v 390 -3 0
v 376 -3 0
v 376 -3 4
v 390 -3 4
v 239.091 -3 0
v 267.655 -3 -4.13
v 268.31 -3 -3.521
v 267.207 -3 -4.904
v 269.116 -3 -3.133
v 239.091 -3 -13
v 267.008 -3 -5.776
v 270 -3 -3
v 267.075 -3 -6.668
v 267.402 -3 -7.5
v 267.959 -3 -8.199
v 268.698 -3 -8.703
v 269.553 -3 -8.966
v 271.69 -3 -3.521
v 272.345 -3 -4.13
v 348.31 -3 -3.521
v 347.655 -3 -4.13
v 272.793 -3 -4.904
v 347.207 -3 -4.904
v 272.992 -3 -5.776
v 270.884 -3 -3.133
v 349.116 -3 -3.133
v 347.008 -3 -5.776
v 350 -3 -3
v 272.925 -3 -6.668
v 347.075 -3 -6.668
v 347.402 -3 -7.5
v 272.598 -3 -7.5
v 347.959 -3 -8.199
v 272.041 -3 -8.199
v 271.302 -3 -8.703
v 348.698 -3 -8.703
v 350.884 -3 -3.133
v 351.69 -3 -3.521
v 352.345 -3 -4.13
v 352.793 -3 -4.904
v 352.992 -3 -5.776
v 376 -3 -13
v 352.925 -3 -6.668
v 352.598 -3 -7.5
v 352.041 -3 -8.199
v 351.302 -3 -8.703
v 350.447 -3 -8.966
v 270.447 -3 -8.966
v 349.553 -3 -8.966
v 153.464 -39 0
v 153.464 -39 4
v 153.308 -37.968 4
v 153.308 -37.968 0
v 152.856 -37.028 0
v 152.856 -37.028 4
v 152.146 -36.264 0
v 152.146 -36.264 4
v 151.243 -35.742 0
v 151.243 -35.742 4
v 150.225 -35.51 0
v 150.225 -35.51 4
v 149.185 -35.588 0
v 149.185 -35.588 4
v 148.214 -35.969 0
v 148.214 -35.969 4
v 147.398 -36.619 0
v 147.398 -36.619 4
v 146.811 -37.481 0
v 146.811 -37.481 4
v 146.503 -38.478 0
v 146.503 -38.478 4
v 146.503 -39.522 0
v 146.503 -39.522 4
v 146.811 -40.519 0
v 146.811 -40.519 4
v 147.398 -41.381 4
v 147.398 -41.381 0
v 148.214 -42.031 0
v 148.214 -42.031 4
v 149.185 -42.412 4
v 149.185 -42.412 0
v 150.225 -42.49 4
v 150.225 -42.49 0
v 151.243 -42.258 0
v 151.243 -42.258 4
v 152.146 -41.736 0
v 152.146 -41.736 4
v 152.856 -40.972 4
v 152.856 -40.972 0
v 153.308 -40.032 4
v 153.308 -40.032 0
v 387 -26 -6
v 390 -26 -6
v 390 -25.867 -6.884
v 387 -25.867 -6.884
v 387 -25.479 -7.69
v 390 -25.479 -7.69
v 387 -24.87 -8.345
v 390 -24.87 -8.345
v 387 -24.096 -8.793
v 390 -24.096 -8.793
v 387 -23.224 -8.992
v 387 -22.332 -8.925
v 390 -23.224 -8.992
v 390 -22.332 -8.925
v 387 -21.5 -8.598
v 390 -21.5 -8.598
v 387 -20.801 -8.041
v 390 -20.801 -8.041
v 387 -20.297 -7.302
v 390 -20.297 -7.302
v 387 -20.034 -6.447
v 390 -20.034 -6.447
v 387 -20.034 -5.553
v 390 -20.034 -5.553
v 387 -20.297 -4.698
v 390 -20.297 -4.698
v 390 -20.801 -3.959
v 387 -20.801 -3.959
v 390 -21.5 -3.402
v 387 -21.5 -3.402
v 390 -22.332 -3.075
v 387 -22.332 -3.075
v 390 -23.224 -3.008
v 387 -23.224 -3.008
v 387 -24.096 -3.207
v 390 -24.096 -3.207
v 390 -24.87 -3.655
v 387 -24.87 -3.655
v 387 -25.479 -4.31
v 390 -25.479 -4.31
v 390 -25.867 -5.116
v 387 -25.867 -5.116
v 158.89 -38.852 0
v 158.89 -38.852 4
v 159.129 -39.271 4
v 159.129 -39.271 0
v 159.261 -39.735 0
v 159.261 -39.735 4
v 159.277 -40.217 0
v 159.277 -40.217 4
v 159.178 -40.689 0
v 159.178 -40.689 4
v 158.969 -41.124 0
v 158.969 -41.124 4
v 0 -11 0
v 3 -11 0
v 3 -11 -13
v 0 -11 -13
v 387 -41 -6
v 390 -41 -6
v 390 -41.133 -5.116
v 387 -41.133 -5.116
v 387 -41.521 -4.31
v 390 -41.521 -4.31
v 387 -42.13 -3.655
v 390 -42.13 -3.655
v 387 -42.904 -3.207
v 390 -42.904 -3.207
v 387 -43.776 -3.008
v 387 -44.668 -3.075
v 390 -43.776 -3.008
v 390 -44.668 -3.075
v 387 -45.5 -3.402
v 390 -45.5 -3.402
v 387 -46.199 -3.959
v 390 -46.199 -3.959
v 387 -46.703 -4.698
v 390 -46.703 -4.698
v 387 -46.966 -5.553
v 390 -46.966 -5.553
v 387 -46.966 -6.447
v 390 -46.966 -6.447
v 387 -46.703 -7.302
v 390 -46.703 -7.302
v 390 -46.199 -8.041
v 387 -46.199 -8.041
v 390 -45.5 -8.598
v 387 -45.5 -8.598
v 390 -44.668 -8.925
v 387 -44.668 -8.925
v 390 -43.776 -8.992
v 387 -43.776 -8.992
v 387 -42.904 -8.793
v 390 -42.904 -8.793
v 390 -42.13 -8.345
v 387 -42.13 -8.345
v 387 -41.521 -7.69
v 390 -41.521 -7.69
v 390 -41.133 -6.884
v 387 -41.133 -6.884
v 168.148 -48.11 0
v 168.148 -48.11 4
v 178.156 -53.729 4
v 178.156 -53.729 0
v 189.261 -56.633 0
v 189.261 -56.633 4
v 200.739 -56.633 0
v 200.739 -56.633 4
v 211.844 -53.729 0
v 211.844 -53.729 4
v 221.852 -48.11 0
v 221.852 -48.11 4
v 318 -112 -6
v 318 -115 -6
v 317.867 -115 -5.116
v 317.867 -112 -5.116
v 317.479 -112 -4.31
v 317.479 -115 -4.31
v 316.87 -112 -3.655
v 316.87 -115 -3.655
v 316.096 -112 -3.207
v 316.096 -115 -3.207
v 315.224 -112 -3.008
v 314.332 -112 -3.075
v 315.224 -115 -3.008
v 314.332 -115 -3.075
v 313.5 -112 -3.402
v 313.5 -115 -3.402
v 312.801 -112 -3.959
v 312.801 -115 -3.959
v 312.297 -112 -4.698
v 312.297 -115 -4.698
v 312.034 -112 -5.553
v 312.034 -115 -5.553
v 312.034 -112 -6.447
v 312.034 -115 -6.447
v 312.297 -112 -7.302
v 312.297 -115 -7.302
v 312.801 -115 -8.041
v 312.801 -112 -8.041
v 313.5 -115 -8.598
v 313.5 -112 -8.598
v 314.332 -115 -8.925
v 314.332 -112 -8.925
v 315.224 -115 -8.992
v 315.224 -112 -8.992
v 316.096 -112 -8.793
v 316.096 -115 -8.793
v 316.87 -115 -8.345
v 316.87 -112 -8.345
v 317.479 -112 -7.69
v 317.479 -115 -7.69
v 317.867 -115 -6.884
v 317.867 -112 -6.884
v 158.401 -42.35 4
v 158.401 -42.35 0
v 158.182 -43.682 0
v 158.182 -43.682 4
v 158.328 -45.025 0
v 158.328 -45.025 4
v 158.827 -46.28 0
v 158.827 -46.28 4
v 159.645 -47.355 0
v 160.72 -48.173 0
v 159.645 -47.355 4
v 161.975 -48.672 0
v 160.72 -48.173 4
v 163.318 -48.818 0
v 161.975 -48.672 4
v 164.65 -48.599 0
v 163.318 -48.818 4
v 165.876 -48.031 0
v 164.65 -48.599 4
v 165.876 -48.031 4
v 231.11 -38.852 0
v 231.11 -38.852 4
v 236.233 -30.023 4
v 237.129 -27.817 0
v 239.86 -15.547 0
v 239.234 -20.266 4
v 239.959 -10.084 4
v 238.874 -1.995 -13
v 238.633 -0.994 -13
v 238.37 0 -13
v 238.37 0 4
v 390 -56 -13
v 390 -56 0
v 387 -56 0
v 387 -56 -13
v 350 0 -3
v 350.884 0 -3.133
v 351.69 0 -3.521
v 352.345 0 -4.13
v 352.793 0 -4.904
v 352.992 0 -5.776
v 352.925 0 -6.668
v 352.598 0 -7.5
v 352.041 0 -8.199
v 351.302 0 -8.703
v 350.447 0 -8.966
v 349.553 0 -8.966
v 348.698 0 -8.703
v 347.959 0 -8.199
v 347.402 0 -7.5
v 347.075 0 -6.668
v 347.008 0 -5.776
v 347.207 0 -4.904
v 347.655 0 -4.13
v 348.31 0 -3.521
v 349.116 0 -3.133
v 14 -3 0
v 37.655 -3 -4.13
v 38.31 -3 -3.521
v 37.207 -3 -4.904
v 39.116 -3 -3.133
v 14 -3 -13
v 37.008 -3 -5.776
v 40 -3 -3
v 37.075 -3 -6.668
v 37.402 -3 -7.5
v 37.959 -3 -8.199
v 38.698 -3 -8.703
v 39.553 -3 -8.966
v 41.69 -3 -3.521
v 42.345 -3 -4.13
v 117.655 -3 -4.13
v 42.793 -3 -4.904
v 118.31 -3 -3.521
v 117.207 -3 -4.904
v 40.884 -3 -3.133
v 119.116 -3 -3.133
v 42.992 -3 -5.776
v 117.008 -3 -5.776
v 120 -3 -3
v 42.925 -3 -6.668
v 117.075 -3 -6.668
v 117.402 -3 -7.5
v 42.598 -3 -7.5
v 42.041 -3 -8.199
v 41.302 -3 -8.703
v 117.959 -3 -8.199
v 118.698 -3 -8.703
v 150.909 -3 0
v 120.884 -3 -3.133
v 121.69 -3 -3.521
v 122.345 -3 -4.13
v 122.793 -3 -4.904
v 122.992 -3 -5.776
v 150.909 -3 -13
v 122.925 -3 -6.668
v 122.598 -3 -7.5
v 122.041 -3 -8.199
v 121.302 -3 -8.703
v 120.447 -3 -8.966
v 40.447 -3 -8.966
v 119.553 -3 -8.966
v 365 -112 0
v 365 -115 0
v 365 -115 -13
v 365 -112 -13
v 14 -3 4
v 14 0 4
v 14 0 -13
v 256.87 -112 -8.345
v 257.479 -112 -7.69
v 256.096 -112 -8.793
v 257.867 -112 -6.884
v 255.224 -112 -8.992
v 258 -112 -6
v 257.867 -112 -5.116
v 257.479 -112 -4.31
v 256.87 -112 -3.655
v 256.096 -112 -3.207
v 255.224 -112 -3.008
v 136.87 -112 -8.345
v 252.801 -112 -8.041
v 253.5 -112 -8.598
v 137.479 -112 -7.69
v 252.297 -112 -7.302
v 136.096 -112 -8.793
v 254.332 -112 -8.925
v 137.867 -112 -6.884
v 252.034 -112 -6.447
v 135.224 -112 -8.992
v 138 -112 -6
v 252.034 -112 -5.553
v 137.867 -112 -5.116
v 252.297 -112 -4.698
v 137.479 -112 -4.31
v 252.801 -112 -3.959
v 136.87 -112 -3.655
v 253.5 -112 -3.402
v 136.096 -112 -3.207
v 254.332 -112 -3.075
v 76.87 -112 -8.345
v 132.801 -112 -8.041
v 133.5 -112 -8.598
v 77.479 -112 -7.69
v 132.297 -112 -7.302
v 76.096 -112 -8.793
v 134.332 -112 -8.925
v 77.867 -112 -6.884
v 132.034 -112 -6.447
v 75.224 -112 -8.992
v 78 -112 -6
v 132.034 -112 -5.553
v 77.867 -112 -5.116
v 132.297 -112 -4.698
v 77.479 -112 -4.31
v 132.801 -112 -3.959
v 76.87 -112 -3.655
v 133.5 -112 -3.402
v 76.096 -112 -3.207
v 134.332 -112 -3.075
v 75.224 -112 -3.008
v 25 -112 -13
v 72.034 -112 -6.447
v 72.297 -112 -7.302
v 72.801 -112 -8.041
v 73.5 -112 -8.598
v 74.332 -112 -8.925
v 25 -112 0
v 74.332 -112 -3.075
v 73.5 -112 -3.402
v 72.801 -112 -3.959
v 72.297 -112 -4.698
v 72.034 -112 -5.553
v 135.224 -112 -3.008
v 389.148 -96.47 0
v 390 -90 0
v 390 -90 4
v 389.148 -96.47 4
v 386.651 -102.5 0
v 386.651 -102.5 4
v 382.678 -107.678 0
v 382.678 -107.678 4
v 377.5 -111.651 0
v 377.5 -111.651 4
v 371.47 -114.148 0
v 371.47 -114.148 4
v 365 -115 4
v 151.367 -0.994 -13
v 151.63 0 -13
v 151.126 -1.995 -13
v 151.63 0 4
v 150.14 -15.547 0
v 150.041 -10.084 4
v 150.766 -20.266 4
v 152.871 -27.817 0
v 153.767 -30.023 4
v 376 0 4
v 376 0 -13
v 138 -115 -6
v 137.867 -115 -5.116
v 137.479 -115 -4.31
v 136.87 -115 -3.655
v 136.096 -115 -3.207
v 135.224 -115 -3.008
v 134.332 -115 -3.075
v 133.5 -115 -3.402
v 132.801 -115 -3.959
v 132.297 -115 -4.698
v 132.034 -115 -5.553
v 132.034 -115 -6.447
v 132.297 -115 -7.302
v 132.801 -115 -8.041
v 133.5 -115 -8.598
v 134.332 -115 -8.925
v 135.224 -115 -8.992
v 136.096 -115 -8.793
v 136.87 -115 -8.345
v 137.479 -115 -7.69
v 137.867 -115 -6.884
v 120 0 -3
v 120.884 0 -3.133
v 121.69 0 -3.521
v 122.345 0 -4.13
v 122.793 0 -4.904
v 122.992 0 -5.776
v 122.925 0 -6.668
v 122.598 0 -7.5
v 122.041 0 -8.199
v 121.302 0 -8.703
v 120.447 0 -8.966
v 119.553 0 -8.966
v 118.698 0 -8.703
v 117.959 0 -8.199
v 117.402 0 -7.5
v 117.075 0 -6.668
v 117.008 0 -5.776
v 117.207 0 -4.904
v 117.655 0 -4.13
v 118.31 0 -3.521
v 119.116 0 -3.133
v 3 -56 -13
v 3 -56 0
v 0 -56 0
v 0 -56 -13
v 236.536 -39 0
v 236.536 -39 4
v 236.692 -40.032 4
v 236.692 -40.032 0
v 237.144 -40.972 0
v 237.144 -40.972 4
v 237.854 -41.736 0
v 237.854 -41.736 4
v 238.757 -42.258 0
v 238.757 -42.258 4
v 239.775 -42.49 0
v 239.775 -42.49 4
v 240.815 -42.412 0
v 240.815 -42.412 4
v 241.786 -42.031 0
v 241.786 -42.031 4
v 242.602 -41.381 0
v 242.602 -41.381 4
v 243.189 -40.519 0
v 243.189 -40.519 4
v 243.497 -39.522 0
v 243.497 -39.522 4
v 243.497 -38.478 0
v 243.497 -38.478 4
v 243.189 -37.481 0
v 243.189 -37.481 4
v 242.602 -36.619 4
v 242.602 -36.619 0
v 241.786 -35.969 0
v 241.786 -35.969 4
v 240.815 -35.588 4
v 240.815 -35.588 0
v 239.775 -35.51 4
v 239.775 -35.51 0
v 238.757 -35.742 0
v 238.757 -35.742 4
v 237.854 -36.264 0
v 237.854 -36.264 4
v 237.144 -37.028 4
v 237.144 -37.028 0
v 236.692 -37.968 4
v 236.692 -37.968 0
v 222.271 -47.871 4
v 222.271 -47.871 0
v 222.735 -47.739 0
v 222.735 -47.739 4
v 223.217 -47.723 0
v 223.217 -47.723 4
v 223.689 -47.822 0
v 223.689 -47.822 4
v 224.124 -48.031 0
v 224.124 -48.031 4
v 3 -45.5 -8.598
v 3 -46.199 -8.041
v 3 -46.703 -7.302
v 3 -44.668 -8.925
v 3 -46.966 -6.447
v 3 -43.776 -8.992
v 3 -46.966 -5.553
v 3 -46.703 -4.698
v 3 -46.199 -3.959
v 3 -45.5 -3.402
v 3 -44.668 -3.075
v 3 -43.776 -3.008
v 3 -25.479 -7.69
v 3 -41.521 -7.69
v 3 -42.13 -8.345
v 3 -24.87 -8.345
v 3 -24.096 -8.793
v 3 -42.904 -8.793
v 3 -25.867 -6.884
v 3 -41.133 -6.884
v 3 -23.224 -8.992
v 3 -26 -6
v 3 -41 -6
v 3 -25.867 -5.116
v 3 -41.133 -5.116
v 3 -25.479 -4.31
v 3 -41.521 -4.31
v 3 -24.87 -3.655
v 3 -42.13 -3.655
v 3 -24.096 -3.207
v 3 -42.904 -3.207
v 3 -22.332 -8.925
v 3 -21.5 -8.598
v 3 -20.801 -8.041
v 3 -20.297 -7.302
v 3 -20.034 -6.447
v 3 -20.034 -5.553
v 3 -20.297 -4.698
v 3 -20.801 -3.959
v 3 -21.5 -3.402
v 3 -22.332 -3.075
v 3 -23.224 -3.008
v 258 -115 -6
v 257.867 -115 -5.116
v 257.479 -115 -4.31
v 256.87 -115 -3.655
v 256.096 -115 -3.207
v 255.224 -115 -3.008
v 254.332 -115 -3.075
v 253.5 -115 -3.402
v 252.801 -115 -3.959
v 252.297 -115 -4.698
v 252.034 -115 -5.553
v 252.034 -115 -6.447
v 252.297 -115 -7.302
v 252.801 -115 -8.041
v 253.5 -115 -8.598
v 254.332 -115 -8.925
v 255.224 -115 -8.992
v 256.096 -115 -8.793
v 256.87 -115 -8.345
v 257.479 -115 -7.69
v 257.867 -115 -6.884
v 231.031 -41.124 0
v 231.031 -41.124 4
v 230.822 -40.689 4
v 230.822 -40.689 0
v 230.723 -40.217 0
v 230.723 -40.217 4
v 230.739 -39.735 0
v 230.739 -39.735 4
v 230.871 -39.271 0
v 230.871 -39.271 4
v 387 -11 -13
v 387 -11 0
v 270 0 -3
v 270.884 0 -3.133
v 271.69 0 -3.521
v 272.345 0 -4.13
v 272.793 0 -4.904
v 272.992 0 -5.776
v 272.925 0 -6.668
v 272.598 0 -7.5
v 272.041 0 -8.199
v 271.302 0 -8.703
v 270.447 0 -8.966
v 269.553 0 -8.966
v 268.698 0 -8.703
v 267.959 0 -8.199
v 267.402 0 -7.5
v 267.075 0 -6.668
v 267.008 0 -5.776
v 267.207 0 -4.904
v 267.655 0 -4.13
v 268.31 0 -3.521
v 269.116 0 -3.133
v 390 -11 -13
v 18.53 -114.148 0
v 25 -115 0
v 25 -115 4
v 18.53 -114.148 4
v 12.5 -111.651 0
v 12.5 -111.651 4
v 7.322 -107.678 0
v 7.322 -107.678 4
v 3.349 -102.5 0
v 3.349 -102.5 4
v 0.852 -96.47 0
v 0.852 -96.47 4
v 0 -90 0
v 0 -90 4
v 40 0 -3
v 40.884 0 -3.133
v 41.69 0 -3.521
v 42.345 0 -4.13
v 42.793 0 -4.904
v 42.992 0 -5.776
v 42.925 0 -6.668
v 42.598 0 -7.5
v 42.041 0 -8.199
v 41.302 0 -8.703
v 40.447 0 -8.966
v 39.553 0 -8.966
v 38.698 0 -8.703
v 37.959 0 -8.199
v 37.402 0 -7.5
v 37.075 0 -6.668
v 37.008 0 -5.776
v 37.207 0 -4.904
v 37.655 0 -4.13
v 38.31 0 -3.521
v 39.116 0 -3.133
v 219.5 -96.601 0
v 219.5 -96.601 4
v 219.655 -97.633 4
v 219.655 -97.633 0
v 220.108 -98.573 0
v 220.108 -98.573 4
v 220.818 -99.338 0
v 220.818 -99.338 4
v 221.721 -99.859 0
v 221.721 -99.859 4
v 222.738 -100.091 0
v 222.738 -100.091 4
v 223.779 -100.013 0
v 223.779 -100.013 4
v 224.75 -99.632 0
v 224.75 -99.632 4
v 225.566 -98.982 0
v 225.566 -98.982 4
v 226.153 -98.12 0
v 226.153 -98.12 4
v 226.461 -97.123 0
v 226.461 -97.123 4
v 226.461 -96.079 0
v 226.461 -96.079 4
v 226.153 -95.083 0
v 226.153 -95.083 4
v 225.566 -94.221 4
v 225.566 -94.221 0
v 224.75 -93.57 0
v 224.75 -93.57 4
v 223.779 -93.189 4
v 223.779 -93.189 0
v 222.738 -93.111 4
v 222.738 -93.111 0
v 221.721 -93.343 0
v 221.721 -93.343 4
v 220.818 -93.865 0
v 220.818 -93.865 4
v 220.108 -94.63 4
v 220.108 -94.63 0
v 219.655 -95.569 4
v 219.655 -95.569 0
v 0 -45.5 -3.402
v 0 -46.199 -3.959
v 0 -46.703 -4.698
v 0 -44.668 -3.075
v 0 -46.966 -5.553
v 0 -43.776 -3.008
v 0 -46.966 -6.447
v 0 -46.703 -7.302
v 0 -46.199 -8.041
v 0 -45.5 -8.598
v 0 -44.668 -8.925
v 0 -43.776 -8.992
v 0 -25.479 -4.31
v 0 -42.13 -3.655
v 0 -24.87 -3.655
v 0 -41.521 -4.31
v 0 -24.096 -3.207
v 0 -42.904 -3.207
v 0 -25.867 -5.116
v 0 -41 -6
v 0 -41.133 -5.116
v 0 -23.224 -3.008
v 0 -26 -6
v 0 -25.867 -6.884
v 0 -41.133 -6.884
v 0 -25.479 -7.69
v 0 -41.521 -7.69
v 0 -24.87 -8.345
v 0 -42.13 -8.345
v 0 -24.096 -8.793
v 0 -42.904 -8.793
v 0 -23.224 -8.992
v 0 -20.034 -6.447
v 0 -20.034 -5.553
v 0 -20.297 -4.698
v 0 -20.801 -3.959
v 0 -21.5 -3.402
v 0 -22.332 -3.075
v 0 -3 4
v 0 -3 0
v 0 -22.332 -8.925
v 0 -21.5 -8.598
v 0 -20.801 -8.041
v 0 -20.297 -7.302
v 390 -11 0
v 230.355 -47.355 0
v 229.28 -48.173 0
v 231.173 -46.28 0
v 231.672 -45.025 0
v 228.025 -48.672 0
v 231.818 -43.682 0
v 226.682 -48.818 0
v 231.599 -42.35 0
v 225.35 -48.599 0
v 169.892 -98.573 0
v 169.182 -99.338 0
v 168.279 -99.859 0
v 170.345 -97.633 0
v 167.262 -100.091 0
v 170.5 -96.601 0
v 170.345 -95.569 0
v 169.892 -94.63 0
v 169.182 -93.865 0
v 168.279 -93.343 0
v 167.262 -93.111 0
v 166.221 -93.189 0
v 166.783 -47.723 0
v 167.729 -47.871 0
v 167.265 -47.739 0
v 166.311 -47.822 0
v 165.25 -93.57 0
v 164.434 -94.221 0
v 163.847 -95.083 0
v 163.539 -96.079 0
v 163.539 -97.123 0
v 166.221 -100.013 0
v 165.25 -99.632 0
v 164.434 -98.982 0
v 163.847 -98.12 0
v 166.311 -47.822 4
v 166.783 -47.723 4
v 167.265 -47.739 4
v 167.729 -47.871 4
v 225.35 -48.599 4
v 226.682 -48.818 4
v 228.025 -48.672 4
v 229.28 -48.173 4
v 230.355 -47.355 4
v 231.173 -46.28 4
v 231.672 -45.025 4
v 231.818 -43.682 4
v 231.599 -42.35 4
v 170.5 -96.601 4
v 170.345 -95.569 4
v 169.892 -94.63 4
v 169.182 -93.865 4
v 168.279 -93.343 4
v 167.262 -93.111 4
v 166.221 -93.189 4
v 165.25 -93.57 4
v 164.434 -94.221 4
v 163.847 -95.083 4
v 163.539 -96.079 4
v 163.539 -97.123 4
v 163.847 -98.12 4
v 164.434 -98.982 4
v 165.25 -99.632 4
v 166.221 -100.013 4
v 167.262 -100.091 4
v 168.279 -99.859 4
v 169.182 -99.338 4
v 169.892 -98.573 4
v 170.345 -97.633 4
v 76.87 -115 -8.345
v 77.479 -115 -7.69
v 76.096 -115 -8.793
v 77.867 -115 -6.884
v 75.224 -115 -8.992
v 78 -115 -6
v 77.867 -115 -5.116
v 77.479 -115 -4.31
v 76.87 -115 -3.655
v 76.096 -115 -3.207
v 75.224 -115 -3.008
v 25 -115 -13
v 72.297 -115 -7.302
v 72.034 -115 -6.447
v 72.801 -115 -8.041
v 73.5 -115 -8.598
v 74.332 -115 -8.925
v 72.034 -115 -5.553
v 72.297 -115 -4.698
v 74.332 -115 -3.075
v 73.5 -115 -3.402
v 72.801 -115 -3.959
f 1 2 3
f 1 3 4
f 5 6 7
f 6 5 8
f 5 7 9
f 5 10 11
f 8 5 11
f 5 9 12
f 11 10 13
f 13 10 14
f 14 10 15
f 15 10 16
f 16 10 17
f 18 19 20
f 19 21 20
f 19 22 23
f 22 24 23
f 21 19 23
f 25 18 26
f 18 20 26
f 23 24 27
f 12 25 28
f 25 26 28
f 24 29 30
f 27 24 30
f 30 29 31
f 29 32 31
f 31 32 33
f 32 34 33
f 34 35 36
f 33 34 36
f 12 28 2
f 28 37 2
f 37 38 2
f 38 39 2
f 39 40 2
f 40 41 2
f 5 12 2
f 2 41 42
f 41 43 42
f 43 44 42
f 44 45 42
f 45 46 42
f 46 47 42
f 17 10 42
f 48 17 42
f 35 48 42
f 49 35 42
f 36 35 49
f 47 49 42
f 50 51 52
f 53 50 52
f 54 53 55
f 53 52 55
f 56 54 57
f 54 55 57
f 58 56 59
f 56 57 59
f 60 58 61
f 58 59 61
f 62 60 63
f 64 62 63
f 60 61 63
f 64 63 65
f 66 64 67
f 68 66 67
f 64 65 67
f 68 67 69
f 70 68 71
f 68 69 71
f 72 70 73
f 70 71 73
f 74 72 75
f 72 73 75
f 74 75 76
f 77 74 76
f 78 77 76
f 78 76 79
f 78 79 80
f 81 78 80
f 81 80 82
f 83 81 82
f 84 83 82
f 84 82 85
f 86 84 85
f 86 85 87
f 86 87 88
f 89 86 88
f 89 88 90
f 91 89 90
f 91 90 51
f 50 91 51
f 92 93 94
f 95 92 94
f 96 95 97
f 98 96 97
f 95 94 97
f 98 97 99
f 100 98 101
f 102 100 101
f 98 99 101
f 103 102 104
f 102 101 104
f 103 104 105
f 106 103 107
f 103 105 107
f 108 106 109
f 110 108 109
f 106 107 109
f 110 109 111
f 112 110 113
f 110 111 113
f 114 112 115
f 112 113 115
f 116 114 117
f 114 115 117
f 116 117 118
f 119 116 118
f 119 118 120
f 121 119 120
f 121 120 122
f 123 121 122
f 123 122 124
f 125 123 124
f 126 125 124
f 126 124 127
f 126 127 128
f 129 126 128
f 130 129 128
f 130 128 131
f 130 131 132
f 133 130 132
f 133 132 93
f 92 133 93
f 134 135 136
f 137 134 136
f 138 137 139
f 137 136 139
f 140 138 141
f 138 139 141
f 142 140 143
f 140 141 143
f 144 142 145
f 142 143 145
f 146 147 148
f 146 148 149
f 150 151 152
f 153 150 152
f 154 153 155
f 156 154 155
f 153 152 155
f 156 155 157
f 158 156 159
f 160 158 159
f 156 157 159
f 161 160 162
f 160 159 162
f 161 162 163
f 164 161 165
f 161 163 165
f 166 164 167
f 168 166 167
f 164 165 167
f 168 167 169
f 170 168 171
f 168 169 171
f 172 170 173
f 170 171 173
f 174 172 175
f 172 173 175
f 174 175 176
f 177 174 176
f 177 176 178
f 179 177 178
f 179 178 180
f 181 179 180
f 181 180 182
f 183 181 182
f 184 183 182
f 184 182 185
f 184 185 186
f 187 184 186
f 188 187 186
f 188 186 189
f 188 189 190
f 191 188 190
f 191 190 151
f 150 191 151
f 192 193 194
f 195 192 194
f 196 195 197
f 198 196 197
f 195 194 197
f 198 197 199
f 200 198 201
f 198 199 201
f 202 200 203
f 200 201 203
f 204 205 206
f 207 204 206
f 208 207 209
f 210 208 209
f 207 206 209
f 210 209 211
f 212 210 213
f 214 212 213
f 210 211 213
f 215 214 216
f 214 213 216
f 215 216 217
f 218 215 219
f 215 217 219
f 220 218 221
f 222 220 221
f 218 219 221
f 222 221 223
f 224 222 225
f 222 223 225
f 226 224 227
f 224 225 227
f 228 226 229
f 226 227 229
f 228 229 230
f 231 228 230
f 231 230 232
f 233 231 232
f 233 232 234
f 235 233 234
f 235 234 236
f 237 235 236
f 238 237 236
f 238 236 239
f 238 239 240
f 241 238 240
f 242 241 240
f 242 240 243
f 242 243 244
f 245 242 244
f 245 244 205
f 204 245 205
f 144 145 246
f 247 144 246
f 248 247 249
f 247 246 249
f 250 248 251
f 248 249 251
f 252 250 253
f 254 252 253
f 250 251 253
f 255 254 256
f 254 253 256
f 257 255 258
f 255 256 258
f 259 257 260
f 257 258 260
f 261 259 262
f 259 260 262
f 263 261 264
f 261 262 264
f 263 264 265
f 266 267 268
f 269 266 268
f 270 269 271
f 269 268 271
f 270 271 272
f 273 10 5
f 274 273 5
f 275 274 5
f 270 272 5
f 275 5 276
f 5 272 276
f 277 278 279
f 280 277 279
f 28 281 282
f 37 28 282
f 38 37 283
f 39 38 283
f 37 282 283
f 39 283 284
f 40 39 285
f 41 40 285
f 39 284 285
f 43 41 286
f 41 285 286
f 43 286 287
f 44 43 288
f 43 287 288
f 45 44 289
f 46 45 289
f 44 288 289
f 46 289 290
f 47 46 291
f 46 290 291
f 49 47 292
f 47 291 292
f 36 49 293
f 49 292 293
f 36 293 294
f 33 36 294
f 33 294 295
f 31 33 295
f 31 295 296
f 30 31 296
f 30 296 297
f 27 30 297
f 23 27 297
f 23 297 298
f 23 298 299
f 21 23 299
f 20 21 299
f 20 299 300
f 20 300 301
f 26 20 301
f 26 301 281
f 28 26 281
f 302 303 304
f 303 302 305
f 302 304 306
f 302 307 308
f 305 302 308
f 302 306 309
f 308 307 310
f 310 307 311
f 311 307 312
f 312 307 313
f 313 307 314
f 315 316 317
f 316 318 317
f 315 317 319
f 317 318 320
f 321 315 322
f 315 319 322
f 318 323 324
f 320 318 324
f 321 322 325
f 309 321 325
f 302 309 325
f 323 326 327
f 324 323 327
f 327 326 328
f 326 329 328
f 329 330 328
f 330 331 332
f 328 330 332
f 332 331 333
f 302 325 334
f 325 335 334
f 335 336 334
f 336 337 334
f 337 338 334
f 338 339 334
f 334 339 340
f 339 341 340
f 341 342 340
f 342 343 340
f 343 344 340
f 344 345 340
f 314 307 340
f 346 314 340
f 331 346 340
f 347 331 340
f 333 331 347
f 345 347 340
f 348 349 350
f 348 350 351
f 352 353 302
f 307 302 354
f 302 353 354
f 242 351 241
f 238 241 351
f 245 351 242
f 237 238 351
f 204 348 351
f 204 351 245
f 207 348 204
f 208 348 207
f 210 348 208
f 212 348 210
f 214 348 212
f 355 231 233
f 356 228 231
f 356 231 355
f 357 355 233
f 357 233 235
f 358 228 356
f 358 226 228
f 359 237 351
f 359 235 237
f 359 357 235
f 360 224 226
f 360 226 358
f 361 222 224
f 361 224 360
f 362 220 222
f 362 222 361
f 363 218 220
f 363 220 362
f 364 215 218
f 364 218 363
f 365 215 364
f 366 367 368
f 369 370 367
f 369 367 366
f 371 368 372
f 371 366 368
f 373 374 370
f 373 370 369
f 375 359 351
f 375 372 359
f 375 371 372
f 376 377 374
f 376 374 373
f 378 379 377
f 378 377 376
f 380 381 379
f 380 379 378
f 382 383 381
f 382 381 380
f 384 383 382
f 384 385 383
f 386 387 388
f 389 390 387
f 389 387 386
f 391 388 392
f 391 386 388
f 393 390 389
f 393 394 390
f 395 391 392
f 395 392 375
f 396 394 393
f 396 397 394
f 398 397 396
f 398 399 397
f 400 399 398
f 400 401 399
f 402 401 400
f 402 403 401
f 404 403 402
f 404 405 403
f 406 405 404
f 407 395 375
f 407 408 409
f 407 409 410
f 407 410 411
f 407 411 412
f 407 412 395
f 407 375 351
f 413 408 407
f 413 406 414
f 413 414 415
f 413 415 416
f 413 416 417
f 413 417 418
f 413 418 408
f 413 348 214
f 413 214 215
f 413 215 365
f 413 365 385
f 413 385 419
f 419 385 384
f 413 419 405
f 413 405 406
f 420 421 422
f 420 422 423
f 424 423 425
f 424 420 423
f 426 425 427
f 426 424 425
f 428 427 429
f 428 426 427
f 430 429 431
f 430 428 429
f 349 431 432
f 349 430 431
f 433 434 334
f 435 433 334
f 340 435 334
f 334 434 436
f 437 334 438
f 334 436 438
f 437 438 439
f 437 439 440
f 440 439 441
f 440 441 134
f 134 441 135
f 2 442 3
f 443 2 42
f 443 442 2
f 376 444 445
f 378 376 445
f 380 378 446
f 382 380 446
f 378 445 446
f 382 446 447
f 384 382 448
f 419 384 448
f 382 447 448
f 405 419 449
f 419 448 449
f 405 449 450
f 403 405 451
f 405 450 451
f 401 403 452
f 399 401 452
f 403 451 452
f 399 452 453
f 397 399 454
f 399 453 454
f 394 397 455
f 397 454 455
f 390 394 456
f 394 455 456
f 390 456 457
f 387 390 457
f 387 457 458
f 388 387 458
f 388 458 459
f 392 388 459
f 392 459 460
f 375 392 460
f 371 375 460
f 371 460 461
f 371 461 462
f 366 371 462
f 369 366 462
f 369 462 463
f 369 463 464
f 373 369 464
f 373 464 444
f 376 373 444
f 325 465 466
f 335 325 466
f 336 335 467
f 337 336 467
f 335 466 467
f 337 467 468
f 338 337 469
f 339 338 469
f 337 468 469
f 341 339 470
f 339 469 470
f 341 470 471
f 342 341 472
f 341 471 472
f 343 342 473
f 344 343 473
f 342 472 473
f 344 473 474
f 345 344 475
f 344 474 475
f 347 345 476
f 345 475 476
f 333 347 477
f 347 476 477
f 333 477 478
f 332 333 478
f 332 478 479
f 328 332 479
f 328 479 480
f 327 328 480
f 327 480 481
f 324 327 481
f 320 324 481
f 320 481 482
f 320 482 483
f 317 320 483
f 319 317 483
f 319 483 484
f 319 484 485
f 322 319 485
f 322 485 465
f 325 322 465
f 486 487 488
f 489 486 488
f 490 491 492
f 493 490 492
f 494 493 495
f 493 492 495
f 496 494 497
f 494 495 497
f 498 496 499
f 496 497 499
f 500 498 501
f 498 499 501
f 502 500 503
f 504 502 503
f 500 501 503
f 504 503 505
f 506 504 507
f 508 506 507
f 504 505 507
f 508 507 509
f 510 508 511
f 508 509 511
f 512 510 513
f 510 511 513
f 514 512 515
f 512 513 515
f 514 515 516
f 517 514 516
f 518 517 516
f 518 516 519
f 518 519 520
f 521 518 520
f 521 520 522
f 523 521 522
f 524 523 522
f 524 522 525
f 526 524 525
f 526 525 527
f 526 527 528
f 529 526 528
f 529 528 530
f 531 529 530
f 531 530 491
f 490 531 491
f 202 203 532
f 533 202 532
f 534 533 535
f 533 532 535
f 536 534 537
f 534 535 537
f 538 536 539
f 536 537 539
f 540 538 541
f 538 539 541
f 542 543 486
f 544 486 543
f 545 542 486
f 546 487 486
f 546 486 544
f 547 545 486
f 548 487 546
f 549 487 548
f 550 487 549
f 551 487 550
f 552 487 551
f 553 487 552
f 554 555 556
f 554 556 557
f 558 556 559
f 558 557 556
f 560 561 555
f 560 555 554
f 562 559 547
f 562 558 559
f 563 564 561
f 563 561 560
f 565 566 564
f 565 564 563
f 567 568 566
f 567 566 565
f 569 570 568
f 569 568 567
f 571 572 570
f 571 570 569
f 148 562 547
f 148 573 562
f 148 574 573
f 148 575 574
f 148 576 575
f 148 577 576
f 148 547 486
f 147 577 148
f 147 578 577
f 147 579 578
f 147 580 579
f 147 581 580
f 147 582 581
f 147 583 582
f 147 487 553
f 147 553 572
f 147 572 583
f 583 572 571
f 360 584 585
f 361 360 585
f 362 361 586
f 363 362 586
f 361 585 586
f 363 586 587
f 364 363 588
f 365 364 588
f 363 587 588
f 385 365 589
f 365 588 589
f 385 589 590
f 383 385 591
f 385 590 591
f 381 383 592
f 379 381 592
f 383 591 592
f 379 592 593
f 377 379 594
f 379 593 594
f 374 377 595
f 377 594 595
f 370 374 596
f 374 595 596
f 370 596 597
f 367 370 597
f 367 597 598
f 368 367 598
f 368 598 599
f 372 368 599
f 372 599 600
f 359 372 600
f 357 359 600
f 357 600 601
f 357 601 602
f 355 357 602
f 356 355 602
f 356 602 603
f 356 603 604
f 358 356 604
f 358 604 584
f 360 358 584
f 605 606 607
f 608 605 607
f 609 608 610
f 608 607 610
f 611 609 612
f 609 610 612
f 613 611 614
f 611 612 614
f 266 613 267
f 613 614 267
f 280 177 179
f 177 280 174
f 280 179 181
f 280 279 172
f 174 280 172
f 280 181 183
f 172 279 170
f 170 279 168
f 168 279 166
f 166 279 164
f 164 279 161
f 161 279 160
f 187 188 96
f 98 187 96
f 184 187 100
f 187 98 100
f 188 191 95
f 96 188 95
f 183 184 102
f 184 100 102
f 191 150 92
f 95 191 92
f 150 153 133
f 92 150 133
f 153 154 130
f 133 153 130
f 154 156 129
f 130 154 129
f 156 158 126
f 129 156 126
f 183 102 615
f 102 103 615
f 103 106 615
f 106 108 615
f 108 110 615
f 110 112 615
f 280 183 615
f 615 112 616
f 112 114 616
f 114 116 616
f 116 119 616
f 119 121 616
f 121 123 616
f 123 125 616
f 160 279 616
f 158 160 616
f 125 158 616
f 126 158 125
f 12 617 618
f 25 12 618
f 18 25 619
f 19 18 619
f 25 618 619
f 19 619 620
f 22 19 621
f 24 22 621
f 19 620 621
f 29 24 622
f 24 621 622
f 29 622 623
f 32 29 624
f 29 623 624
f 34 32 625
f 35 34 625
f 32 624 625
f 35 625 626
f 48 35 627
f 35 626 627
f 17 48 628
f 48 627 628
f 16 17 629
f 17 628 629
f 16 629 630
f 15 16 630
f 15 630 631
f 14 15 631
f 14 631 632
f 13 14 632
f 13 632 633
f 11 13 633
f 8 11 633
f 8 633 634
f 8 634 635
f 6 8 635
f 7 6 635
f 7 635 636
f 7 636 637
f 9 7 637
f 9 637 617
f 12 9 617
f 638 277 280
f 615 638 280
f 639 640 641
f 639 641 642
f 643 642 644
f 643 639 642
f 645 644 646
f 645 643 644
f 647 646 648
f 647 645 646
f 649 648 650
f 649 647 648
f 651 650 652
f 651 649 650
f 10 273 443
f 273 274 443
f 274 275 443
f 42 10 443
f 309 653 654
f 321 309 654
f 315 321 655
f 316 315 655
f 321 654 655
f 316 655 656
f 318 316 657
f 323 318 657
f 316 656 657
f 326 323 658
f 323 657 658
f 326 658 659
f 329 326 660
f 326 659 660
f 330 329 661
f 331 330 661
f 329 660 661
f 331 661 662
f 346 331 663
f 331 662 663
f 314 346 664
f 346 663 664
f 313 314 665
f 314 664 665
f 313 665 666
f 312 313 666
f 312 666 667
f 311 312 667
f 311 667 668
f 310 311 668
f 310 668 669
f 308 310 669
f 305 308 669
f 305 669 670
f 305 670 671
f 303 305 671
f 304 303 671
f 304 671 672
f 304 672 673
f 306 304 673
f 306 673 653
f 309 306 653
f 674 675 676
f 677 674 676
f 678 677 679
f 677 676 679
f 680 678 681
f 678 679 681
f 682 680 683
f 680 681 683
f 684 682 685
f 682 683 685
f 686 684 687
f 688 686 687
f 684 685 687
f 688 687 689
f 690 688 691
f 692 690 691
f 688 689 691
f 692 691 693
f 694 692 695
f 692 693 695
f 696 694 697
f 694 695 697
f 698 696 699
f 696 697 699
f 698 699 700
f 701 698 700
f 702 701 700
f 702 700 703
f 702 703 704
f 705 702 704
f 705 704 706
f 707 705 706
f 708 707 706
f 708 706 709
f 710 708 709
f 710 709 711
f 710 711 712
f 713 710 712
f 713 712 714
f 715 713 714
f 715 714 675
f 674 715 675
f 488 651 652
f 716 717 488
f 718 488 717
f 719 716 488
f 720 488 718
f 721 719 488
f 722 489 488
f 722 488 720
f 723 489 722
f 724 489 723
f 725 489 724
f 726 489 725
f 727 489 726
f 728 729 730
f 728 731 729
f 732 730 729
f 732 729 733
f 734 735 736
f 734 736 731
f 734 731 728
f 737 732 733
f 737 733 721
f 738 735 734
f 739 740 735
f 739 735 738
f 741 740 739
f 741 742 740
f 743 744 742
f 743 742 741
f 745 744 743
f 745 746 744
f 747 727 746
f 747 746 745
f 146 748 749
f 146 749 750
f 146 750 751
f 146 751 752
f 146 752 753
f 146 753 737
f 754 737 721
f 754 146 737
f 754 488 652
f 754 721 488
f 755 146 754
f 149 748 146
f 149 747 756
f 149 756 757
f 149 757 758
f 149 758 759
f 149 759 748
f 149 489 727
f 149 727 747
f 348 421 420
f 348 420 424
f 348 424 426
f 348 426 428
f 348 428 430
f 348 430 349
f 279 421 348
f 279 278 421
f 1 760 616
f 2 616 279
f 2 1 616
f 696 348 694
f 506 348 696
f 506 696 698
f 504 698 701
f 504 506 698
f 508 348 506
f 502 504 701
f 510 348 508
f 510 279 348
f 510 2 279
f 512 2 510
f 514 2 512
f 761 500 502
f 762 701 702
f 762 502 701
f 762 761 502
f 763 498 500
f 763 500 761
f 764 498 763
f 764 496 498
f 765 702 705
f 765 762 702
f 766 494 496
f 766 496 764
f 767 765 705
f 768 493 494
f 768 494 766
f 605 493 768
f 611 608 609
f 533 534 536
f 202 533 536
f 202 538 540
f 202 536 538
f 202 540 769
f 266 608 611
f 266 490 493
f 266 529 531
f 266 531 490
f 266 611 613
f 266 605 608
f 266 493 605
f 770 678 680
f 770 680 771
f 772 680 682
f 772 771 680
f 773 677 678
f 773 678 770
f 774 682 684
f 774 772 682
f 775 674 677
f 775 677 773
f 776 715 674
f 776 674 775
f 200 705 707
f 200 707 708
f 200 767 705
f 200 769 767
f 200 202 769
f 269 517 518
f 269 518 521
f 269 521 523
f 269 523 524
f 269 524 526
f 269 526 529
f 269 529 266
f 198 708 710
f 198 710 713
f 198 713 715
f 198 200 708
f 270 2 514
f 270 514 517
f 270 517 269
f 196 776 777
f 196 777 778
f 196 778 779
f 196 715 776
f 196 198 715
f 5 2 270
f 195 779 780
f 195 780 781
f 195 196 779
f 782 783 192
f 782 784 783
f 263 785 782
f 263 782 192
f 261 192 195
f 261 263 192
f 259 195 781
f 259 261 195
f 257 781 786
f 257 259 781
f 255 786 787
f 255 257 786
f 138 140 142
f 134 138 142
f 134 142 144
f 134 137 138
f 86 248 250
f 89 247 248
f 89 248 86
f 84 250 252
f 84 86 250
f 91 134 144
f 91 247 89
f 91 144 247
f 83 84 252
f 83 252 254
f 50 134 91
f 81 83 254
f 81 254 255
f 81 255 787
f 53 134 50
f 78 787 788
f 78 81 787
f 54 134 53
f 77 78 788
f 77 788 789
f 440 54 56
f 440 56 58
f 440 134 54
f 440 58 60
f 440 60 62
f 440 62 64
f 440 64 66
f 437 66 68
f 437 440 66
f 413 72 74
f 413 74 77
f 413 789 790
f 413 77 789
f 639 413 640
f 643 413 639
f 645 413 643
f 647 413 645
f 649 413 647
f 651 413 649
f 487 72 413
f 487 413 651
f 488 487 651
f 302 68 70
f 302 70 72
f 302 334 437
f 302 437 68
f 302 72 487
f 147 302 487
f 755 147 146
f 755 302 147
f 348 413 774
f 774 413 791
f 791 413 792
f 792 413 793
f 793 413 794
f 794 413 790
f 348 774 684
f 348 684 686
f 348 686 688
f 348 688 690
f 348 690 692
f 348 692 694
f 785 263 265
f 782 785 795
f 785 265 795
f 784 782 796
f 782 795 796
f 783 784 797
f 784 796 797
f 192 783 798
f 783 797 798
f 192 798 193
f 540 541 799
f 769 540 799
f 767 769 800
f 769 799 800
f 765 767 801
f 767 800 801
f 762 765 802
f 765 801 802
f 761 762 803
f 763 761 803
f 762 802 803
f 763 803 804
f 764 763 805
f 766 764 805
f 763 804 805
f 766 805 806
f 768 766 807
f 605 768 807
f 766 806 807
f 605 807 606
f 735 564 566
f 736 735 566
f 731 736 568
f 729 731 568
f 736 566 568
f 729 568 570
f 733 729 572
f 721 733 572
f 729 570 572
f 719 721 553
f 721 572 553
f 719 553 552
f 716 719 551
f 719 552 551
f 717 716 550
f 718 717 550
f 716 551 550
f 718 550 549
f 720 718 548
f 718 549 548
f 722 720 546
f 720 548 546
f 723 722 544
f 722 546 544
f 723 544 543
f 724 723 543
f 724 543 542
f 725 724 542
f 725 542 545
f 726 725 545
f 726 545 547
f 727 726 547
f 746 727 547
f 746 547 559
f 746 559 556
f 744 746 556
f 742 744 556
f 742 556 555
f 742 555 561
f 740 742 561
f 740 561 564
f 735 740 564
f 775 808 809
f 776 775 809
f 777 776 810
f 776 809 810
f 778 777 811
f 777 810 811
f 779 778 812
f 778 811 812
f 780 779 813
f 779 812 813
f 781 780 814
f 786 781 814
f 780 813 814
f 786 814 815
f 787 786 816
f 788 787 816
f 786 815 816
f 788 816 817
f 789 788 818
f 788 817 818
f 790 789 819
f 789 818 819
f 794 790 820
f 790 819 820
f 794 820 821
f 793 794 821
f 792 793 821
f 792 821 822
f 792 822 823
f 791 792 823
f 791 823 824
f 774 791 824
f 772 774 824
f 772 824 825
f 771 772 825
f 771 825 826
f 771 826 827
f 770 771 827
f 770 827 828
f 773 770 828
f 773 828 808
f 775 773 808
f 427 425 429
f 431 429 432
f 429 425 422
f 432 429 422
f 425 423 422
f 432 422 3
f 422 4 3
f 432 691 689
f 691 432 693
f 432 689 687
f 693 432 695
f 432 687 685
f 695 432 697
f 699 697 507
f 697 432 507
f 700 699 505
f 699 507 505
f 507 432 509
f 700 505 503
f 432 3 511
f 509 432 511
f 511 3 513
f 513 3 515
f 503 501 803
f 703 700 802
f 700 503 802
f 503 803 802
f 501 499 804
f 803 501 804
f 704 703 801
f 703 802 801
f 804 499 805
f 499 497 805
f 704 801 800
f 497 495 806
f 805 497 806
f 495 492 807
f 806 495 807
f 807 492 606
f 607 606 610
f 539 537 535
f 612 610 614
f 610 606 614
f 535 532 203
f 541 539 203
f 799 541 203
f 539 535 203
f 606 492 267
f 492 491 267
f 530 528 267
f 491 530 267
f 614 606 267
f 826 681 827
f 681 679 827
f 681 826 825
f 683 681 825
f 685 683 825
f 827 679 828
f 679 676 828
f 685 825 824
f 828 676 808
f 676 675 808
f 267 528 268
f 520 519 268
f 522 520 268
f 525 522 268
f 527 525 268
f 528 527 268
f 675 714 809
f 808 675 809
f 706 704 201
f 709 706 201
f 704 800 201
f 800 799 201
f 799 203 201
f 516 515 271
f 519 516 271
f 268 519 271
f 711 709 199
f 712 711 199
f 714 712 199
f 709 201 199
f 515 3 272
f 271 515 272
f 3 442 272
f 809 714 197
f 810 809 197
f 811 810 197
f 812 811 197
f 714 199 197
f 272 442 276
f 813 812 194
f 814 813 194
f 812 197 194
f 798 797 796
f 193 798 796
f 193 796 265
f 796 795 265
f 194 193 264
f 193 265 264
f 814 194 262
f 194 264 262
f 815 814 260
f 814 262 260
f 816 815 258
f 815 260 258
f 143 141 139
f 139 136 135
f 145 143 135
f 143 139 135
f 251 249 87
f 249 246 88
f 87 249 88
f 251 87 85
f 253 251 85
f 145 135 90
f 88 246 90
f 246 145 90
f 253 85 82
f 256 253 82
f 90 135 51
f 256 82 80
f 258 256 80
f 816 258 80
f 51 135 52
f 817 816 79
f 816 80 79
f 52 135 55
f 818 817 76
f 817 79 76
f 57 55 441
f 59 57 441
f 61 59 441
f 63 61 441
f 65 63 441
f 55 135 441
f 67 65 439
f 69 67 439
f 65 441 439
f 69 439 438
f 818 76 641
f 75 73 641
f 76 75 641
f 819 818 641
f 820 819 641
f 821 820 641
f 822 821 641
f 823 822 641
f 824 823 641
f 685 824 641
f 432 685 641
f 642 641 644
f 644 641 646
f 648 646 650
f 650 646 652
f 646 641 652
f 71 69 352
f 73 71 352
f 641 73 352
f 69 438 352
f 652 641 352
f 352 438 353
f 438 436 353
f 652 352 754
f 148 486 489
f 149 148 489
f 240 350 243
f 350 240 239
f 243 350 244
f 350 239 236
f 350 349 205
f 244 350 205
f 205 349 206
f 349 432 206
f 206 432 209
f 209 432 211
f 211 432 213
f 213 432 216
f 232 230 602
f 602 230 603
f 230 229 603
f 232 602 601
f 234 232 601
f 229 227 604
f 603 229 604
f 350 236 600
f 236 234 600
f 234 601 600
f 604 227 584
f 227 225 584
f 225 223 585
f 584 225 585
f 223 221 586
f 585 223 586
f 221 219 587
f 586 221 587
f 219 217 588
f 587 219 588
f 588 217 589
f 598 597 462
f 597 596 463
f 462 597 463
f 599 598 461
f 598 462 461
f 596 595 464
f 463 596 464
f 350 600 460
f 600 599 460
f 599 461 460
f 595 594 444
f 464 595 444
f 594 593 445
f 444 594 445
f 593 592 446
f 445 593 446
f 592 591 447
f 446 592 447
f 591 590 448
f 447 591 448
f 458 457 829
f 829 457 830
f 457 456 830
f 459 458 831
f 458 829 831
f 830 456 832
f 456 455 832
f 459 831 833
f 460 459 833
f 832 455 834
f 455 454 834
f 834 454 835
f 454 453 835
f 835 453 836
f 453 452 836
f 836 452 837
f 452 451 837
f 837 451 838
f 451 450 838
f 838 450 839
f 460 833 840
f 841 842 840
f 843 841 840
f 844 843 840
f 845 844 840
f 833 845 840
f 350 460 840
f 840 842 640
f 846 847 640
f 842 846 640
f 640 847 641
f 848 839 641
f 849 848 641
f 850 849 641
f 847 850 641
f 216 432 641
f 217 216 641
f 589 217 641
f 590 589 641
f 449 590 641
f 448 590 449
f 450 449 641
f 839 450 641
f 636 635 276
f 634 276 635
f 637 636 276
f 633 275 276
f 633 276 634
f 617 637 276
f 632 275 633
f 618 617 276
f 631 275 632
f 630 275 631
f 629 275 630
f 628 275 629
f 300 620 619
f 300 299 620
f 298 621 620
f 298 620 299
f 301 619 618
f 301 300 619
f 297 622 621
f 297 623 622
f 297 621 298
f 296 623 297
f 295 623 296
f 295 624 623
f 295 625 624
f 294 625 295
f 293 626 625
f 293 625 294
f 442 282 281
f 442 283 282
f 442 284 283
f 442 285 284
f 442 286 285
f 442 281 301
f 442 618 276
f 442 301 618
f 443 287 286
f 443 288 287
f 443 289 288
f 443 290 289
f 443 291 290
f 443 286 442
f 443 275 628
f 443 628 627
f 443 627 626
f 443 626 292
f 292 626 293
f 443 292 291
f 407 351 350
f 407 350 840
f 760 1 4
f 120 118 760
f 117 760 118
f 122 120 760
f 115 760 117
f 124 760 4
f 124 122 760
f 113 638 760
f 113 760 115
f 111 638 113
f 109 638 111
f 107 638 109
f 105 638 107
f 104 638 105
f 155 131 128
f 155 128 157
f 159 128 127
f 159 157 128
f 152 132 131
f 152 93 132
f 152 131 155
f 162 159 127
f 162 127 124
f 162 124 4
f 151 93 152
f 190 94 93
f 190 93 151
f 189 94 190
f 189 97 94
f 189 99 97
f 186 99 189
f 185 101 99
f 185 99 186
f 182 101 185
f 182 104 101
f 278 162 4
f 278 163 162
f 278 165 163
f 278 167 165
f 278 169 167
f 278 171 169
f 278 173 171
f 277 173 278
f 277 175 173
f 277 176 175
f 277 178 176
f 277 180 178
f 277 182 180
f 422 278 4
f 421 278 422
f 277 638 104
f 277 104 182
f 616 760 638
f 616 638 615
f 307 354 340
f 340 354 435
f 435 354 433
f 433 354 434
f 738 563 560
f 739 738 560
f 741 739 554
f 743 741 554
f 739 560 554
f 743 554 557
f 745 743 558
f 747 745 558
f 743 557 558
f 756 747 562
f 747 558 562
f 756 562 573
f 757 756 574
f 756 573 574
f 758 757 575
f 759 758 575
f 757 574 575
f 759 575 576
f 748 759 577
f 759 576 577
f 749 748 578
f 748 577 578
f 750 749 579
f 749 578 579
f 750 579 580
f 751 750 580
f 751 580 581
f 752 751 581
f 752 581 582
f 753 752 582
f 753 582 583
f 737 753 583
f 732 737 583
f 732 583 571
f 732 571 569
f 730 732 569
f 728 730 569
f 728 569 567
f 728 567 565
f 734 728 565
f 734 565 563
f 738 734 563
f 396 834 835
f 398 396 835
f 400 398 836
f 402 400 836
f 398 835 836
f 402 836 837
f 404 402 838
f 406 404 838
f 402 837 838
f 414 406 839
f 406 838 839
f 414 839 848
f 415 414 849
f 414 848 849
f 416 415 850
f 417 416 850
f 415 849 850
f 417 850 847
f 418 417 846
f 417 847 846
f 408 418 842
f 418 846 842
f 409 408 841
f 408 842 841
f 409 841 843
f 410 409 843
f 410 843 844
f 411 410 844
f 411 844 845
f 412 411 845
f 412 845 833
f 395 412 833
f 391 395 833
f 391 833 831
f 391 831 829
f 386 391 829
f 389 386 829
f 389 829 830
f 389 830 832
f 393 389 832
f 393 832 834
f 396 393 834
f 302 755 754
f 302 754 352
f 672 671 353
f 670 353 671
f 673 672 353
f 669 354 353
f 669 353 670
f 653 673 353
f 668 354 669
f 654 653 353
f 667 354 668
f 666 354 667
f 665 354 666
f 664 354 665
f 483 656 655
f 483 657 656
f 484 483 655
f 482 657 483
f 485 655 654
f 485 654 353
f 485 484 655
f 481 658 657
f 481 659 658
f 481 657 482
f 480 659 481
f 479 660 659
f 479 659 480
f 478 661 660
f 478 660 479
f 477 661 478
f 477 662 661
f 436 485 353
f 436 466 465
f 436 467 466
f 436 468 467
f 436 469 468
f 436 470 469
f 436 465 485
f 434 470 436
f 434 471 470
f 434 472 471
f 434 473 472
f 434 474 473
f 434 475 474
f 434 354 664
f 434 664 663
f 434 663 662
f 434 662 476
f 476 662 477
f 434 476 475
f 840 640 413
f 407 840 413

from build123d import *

# Parameters (mm, degrees)
EXTRUDE_1_DEPTH     = 4
SKETCH_5_W          = 390
SKETCH_5_H          = 17
EXTRUDE_2_DEPTH     = 3
SKETCH_7_R          = 3.5
CUT_EXTRUDE_1_DEPTH = 407.957000186
SKETCH_8_W          = 340
SKETCH_8_H          = 3
EXTRUDE_3_DEPTH     = 13
SKETCH_9_W          = 14
SKETCH_9_H          = 17
CUT_EXTRUDE_2_DEPTH = 3
SKETCH_18_W         = 3
SKETCH_18_H         = 45
EXTRUDE_4_DEPTH     = 13
SKETCH_19_R         = 3
CUT_EXTRUDE_3_DEPTH = 13
SKETCH_20_R         = 3
CUT_EXTRUDE_4_DEPTH = 407.809537745
SKETCH_22_R         = 3
CUT_EXTRUDE_5_DEPTH = 13


with BuildPart() as part:
    # 草图1 → 凸台-拉伸1 (new body)
    with BuildSketch(Plane.XY):
        with BuildLine():
            Line((0, 0), (390, 0))
            Line((390, 0), (390, -90))
            ThreePointArc((390, -90), (382.67766953, -107.67766953), (365, -115))
            Line((365, -115), (25, -115))
            ThreePointArc((25, -115), (7.32233047, -107.67766953), (0, -90))
            Line((0, -90), (0, 0))
        make_face()
    extrude(amount=EXTRUDE_1_DEPTH)

    # 草图5 → 凸台-拉伸2 (add)
    with BuildSketch(Plane(origin=(0, 0, 0), x_dir=(1, 0, 0), z_dir=(0, 1, 0))):
        with Locations((195, 4.5)):
            Rectangle(SKETCH_5_W, SKETCH_5_H)
    extrude(amount=-EXTRUDE_2_DEPTH)

    # 草图7 → 切除-拉伸1 (cut, through all)
    with BuildSketch(Plane.XY.offset(4)):
        with Locations((167, -96.601136347)):
            Circle(SKETCH_7_R)
        with Locations((149.963903366, -39)):
            Circle(SKETCH_7_R)
        with Locations(Location((223, -96.601136347, 0), (0, 0, 180))):
            Circle(SKETCH_7_R)
        with Locations(Location((240.036096634, -39, 0), (0, 0, 180))):
            Circle(SKETCH_7_R)
        with BuildLine():
            ThreePointArc((168.147738424, -48.1103316), (195, -57), (221.852261576, -48.1103316))
            ThreePointArc((221.852261576, -48.1103316), (222.97574381, -47.716458908), (224.124012489, -48.030826634))
            ThreePointArc((224.124012489, -48.030826634), (230.355339059, -47.355339059), (231.030826634, -41.124012489))
            ThreePointArc((231.030826634, -41.124012489), (230.716458908, -39.97574381), (231.1103316, -38.852261576))
            ThreePointArc((231.1103316, -38.852261576), (195, 33), (158.8896684, -38.852261576))
            ThreePointArc((158.8896684, -38.852261576), (159.283541092, -39.97574381), (158.969173366, -41.124012489))
            ThreePointArc((158.969173366, -41.124012489), (159.644660941, -47.355339059), (165.875987511, -48.030826634))
            ThreePointArc((165.875987511, -48.030826634), (167.02425619, -47.716458908), (168.147738424, -48.1103316))
        make_face()
    extrude(amount=-CUT_EXTRUDE_1_DEPTH, mode=Mode.SUBTRACT)

    # 草图8 → 凸台-拉伸3 (add)
    with BuildSketch(Plane(origin=(0, 0, 0), x_dir=(-1, 0, 0), z_dir=(0, 0, -1))):
        with Locations((-195, -113.5)):
            Rectangle(SKETCH_8_W, SKETCH_8_H)
    extrude(amount=EXTRUDE_3_DEPTH)

    # 草图9 → 切除-拉伸2 (cut)
    with BuildSketch(Plane(origin=(0, 0, 0), x_dir=(1, 0, 0), z_dir=(0, 1, 0))):
        with Locations((383, 4.5)):
            Rectangle(SKETCH_9_W, SKETCH_9_H)
        with Locations((7, 4.5)):
            Rectangle(SKETCH_9_W, SKETCH_9_H)
    extrude(amount=-CUT_EXTRUDE_2_DEPTH, mode=Mode.SUBTRACT)

    # 草图18 → 凸台-拉伸4 (add)
    with BuildSketch(Plane(origin=(0, 0, 0), x_dir=(-1, 0, 0), z_dir=(0, 0, -1))):
        with Locations((-388.5, -33.5)):
            Rectangle(SKETCH_18_W, SKETCH_18_H)
        with Locations((-1.5, -33.5)):
            Rectangle(SKETCH_18_W, SKETCH_18_H)
    extrude(amount=EXTRUDE_4_DEPTH)

    # 草图19 → 切除-拉伸3 (cut)
    with BuildSketch(Plane(origin=(0, 0, 0), x_dir=(1, 0, 0), z_dir=(0, 1, 0))):
        with Locations(Location((270, 6, 0), (0, 0, 270))):
            Circle(SKETCH_19_R)
        with Locations(Location((350, 6, 0), (0, 0, 270))):
            Circle(SKETCH_19_R)
        with Locations(Location((40, 6, 0), (0, 0, 270))):
            Circle(SKETCH_19_R)
        with Locations(Location((120, 6, 0), (0, 0, 270))):
            Circle(SKETCH_19_R)
    extrude(amount=-CUT_EXTRUDE_3_DEPTH, mode=Mode.SUBTRACT)

    # 草图20 → 切除-拉伸4 (cut, through all)
    with BuildSketch(Plane(origin=(390, 0, 0), x_dir=(0, 0, -1), z_dir=(1, 0, 0))):
        with Locations(Location((6, -23, 0), (0, 0, 270))):
            Circle(SKETCH_20_R)
        with Locations(Location((6, -44, 0), (0, 0, 90))):
            Circle(SKETCH_20_R)
    extrude(amount=-CUT_EXTRUDE_4_DEPTH, mode=Mode.SUBTRACT)

    # 草图22 → 切除-拉伸5 (cut)
    with BuildSketch(Plane.XZ.offset(115)):
        with Locations((75, -6)):
            Circle(SKETCH_22_R)
        with Locations((135, -6)):
            Circle(SKETCH_22_R)
        with Locations((315, -6)):
            Circle(SKETCH_22_R)
        with Locations((255, -6)):
            Circle(SKETCH_22_R)
    extrude(amount=-CUT_EXTRUDE_5_DEPTH, mode=Mode.SUBTRACT)


solid = part.part
